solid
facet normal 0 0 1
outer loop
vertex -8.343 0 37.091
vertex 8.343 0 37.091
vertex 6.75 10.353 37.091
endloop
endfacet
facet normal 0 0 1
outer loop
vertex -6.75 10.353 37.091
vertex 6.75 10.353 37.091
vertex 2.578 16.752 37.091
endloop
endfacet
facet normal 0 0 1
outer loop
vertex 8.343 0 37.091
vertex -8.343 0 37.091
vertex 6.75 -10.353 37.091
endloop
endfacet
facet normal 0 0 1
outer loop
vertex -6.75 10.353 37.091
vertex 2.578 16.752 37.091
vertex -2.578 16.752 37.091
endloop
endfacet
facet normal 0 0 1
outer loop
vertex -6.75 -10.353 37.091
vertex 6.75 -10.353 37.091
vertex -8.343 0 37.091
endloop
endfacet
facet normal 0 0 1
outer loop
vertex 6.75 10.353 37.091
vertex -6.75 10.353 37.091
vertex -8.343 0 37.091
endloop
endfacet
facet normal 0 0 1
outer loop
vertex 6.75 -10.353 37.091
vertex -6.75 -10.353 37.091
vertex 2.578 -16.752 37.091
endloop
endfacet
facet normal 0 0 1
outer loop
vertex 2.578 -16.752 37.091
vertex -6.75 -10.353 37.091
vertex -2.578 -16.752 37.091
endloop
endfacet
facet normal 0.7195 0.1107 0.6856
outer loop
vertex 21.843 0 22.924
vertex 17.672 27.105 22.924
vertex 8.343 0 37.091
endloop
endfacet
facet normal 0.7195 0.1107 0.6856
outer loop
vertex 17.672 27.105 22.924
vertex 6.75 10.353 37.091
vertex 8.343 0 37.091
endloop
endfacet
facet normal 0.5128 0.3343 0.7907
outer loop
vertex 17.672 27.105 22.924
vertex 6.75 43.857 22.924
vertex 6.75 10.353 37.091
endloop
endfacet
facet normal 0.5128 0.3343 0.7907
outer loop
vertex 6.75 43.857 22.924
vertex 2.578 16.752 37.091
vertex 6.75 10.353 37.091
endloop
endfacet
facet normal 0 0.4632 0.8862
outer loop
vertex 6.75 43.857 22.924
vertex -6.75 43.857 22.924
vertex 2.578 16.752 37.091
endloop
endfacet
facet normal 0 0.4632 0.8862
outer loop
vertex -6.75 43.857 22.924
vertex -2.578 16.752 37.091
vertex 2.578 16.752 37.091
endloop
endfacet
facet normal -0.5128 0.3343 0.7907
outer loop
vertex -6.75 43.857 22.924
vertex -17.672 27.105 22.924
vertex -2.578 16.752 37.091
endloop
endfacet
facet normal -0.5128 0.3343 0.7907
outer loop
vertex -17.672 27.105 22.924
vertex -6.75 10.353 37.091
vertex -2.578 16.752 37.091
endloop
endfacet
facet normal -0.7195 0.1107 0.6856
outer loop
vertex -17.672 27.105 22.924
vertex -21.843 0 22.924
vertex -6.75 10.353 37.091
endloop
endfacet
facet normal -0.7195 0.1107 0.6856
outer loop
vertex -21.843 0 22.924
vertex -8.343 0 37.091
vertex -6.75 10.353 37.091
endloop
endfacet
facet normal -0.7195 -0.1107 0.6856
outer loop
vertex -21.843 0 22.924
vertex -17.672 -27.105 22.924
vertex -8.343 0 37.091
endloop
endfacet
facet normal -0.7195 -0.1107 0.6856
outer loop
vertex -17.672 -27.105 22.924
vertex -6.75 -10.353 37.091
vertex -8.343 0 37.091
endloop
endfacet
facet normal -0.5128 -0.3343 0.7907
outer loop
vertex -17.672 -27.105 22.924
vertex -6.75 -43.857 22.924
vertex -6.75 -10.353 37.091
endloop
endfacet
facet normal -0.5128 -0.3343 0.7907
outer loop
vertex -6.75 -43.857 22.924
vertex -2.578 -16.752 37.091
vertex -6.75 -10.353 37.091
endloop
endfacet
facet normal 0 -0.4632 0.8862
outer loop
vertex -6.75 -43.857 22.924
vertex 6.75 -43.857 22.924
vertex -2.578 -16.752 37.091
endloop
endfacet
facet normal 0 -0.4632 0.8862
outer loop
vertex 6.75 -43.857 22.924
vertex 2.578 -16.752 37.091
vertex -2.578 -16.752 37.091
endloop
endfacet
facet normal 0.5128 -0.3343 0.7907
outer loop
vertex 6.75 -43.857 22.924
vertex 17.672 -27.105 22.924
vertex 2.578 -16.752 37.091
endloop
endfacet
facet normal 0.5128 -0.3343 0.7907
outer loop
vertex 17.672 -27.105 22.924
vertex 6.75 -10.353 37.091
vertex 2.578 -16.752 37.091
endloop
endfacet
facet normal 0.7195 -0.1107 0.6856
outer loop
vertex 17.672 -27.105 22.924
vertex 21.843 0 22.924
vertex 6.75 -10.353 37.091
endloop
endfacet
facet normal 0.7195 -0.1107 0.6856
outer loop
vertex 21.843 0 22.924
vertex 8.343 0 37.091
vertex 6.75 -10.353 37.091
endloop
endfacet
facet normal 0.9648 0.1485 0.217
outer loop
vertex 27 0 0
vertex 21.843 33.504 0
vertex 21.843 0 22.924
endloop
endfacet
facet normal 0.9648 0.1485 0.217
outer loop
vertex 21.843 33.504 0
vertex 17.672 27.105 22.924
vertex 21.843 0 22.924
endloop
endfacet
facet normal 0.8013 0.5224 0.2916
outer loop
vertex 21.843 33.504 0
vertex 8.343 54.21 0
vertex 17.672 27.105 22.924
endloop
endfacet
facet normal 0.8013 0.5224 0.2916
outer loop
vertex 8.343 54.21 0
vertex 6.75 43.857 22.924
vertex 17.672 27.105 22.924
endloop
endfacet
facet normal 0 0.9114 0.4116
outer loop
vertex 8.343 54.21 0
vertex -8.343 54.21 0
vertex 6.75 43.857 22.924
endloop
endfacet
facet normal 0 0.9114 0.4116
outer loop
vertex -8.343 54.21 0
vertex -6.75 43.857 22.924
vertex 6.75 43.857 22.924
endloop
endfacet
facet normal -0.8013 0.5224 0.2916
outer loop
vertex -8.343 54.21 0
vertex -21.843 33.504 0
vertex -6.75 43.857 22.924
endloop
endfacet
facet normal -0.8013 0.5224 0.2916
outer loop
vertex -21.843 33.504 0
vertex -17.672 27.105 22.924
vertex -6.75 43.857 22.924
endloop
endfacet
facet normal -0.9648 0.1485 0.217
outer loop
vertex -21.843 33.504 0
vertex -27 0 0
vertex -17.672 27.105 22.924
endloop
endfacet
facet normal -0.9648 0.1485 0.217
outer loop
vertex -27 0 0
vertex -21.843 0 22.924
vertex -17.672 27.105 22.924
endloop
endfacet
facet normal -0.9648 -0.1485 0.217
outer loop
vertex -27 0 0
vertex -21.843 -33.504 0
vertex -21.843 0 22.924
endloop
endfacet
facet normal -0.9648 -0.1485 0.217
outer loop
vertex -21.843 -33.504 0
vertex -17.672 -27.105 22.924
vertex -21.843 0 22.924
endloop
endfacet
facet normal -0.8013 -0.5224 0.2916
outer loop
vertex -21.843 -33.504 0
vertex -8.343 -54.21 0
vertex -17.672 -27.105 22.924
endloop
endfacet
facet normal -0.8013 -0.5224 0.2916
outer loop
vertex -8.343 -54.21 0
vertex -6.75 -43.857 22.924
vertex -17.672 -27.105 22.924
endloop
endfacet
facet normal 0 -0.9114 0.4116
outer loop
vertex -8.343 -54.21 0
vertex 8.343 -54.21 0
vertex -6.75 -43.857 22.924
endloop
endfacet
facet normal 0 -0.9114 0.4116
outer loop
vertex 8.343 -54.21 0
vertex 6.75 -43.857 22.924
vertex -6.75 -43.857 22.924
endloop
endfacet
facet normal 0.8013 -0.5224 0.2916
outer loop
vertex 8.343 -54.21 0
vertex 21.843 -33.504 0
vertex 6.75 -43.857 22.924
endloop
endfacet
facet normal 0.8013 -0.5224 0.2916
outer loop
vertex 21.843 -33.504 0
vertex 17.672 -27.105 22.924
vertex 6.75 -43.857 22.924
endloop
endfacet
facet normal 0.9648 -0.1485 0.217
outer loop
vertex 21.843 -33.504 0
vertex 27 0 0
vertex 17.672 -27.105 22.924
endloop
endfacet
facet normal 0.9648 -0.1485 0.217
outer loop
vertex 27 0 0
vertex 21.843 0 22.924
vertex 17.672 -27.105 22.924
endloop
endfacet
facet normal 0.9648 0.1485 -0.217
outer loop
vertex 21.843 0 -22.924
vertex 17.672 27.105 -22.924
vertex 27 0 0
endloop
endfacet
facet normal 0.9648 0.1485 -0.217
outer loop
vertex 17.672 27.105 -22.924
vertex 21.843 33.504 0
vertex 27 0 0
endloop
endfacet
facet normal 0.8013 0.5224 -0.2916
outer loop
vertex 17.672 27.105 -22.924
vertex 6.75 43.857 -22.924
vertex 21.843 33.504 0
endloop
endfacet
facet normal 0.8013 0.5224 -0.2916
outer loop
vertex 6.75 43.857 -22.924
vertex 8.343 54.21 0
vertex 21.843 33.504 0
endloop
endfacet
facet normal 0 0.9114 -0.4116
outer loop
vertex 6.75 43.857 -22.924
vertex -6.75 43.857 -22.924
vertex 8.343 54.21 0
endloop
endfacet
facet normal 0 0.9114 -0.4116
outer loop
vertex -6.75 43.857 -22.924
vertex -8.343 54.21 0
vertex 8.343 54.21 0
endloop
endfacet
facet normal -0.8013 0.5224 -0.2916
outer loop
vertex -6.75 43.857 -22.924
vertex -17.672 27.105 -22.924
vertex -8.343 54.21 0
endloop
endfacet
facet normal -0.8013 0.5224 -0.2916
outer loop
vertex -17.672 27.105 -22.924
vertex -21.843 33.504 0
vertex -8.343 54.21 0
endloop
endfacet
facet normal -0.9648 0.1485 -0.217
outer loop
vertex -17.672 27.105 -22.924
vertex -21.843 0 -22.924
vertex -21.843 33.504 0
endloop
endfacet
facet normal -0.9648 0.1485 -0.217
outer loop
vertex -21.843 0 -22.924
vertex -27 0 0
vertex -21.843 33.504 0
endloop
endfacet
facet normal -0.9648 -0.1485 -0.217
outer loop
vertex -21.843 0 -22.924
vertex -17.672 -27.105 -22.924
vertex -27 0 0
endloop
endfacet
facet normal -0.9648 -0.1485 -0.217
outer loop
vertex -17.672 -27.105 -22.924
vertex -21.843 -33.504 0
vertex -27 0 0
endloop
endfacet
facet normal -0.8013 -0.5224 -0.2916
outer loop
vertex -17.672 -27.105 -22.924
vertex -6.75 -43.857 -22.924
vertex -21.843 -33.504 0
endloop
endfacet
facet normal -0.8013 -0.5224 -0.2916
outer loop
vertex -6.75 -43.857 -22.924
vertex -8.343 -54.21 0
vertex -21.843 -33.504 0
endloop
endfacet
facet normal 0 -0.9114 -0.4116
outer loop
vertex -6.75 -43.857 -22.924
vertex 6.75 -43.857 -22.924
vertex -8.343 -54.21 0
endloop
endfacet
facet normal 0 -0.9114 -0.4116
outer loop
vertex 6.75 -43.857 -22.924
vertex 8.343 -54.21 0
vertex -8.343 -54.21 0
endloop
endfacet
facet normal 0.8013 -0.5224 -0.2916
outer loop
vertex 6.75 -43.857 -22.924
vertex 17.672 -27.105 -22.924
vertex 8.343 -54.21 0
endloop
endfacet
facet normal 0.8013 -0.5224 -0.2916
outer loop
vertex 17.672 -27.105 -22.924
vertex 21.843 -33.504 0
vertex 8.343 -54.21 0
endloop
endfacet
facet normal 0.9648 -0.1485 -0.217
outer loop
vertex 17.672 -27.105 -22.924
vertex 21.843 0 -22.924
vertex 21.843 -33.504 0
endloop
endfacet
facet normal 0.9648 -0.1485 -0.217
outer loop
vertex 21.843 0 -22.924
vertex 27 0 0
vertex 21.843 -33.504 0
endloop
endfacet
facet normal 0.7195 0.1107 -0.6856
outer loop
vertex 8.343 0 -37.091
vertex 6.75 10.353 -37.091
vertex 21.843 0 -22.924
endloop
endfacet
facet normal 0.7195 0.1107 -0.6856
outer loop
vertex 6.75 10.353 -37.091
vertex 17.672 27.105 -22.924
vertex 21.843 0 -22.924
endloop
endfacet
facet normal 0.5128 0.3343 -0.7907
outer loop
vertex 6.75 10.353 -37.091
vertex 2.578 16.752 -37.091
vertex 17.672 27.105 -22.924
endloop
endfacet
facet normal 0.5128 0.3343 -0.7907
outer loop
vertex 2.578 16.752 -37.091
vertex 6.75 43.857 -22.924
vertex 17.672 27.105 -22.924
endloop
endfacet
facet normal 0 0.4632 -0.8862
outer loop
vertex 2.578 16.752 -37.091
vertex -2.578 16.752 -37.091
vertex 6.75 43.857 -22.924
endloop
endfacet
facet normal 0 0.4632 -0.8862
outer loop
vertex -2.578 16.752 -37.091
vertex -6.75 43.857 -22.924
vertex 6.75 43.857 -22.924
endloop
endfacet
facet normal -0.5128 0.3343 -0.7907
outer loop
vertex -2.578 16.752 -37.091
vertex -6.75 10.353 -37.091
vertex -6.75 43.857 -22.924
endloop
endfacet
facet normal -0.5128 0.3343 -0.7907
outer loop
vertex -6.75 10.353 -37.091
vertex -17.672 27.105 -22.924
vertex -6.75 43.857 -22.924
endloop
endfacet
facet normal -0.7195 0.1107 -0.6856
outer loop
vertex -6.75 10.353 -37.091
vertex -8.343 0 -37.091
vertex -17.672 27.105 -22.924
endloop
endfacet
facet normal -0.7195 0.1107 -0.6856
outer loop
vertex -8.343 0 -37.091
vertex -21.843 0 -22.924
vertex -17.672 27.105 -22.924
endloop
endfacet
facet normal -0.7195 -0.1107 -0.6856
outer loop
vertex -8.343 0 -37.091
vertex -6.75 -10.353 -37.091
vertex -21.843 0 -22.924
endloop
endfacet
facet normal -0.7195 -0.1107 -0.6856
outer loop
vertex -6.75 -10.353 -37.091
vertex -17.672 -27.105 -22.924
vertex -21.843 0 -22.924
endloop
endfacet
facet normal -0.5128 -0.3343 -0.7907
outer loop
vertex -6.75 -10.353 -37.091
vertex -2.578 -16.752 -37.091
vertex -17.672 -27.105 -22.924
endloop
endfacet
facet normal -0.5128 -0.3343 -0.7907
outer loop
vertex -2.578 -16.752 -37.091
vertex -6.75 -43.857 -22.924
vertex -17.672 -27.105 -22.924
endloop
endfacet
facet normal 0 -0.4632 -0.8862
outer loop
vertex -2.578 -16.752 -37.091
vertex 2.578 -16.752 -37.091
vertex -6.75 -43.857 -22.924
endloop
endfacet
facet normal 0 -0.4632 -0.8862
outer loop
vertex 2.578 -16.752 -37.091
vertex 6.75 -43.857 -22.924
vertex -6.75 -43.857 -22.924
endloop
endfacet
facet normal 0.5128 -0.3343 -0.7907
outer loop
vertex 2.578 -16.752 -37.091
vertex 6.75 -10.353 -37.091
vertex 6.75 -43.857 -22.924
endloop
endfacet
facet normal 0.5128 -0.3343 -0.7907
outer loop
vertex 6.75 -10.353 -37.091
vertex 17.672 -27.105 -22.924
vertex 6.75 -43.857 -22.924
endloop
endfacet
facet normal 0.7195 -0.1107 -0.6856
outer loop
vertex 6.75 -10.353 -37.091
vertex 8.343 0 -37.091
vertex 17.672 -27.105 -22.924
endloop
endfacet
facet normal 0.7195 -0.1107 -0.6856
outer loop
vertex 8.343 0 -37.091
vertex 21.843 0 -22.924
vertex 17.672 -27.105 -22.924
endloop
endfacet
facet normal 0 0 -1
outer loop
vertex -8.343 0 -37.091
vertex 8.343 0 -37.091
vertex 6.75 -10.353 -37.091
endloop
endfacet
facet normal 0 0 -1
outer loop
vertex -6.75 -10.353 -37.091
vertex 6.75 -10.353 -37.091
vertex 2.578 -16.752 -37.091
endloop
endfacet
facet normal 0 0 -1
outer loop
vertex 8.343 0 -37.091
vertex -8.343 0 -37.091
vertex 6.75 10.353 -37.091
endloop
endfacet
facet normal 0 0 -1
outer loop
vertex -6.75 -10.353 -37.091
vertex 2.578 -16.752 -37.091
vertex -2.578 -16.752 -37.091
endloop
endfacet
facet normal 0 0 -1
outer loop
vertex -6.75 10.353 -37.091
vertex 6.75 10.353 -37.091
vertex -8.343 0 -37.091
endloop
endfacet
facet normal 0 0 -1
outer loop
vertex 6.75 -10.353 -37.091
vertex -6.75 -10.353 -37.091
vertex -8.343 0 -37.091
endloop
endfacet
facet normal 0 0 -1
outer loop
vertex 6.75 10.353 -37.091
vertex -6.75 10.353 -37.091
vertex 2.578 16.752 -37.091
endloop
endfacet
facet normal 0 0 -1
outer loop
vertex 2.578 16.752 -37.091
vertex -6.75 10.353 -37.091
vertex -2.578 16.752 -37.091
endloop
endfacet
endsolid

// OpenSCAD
// Generated by SolidPython 1.0.1 on 2020-07-29 00:46:49


scale(v = [9, 19, 13]) {
	sphere(r = 3);
}
/***********************************************
*********      SolidPython code:      **********
************************************************
 
# import packages: SolidPython
from solid import *
from solid.utils import *
from itertools import chain, combinations, permutations


class Resize:

    def __init__(self, scad_file):
        self.scad_file = scad_file
        #self.scad_file = import_scad(scad_file)
        # cone/cylinder param:
        self.r1 = 0
        self.r2 = 0
        self.h = 0
        # rectangular prism param:
        self.w = 0
        self.l = 0
        # ellipse param:
        self.r = 0

    # import OpenScad code (file name corresponds to shape)


    # classify shape + parameters
    def assign(self, param1, param2, param3):
        if self.scad_file == 'cone.scad':
            self.r1 = param1
            self.r2 = param2
            self.h = param3
        elif self.scad_file == 'cylinder.scad':
            self.r1 = param1
            self.r2 = param2
            self.h = param3
        elif self.scad_file == 'rectangularPrism.scad':
            self.h = param1
            self.l = param2
            self.w = param3
        else:
            self.r = param1
            self.h = param2

    # resize parameters
    def iterate(self):
        x = range(3, 20, 2)
        i = 1
        if self.scad_file == 'cone.scad':
            tempList = list(permutations(x, 2))
            for temp in tempList:
                param1 = temp[0]
                param2 = temp[1]
                filepath = 'produced_scad_files/' + 'cone' + str(param1) + '_' + str(param2) + '_' + '.scad'
                scad_render_to_file(cylinder(h=param1, r1=param2, r2=0), filepath)

        elif self.scad_file == 'cylinder.scad':
            tempList = list(permutations(x, 3))
            for temp in tempList:
                param1 = temp[0]
                param2 = temp[1]
                filepath = 'produced_scad_files/' + 'cylinder' + str(param1) + '_' + str(param2) + '_' + '.scad'
                scad_render_to_file(cylinder(h=param1, r1=param2, r2=param2), filepath)

        elif self.scad_file == 'rectangularPrism.scad':
            tempList = list(permutations(x, 3))
            for temp in tempList:
                param1 = temp[0]
                param2 = temp[1]
                param3 = temp[2]
                filepath = 'produced_scad_files/' + 'rectangularPrism' + str(param1) + '_' + str(param2) + '_' + str(
                    param3) + '.scad'
                scad_render_to_file(cube(size=(param1, param2, param3)), filepath)

        elif self.scad_file == 'ellipse.scad':
            tempList = list(permutations(x, 4))
            for temp in tempList:
                param1 = temp[0]
                param2 = temp[1]
                param3 = temp[2]
                param4 = temp[3]
                filepath = 'produced_scad_files/' + 'ellipse' + str(param1) + '_' + str(param2) + '_' + str(param3) + '_' + str(param4) + '.scad'
                scad_render_to_file(scale([param1, param2, param3])(sphere(r=param4)), filepath)

    def render_to_scadfile(self):
        scad_render_to_file(scad, 'example.scad') 
 
************************************************/
